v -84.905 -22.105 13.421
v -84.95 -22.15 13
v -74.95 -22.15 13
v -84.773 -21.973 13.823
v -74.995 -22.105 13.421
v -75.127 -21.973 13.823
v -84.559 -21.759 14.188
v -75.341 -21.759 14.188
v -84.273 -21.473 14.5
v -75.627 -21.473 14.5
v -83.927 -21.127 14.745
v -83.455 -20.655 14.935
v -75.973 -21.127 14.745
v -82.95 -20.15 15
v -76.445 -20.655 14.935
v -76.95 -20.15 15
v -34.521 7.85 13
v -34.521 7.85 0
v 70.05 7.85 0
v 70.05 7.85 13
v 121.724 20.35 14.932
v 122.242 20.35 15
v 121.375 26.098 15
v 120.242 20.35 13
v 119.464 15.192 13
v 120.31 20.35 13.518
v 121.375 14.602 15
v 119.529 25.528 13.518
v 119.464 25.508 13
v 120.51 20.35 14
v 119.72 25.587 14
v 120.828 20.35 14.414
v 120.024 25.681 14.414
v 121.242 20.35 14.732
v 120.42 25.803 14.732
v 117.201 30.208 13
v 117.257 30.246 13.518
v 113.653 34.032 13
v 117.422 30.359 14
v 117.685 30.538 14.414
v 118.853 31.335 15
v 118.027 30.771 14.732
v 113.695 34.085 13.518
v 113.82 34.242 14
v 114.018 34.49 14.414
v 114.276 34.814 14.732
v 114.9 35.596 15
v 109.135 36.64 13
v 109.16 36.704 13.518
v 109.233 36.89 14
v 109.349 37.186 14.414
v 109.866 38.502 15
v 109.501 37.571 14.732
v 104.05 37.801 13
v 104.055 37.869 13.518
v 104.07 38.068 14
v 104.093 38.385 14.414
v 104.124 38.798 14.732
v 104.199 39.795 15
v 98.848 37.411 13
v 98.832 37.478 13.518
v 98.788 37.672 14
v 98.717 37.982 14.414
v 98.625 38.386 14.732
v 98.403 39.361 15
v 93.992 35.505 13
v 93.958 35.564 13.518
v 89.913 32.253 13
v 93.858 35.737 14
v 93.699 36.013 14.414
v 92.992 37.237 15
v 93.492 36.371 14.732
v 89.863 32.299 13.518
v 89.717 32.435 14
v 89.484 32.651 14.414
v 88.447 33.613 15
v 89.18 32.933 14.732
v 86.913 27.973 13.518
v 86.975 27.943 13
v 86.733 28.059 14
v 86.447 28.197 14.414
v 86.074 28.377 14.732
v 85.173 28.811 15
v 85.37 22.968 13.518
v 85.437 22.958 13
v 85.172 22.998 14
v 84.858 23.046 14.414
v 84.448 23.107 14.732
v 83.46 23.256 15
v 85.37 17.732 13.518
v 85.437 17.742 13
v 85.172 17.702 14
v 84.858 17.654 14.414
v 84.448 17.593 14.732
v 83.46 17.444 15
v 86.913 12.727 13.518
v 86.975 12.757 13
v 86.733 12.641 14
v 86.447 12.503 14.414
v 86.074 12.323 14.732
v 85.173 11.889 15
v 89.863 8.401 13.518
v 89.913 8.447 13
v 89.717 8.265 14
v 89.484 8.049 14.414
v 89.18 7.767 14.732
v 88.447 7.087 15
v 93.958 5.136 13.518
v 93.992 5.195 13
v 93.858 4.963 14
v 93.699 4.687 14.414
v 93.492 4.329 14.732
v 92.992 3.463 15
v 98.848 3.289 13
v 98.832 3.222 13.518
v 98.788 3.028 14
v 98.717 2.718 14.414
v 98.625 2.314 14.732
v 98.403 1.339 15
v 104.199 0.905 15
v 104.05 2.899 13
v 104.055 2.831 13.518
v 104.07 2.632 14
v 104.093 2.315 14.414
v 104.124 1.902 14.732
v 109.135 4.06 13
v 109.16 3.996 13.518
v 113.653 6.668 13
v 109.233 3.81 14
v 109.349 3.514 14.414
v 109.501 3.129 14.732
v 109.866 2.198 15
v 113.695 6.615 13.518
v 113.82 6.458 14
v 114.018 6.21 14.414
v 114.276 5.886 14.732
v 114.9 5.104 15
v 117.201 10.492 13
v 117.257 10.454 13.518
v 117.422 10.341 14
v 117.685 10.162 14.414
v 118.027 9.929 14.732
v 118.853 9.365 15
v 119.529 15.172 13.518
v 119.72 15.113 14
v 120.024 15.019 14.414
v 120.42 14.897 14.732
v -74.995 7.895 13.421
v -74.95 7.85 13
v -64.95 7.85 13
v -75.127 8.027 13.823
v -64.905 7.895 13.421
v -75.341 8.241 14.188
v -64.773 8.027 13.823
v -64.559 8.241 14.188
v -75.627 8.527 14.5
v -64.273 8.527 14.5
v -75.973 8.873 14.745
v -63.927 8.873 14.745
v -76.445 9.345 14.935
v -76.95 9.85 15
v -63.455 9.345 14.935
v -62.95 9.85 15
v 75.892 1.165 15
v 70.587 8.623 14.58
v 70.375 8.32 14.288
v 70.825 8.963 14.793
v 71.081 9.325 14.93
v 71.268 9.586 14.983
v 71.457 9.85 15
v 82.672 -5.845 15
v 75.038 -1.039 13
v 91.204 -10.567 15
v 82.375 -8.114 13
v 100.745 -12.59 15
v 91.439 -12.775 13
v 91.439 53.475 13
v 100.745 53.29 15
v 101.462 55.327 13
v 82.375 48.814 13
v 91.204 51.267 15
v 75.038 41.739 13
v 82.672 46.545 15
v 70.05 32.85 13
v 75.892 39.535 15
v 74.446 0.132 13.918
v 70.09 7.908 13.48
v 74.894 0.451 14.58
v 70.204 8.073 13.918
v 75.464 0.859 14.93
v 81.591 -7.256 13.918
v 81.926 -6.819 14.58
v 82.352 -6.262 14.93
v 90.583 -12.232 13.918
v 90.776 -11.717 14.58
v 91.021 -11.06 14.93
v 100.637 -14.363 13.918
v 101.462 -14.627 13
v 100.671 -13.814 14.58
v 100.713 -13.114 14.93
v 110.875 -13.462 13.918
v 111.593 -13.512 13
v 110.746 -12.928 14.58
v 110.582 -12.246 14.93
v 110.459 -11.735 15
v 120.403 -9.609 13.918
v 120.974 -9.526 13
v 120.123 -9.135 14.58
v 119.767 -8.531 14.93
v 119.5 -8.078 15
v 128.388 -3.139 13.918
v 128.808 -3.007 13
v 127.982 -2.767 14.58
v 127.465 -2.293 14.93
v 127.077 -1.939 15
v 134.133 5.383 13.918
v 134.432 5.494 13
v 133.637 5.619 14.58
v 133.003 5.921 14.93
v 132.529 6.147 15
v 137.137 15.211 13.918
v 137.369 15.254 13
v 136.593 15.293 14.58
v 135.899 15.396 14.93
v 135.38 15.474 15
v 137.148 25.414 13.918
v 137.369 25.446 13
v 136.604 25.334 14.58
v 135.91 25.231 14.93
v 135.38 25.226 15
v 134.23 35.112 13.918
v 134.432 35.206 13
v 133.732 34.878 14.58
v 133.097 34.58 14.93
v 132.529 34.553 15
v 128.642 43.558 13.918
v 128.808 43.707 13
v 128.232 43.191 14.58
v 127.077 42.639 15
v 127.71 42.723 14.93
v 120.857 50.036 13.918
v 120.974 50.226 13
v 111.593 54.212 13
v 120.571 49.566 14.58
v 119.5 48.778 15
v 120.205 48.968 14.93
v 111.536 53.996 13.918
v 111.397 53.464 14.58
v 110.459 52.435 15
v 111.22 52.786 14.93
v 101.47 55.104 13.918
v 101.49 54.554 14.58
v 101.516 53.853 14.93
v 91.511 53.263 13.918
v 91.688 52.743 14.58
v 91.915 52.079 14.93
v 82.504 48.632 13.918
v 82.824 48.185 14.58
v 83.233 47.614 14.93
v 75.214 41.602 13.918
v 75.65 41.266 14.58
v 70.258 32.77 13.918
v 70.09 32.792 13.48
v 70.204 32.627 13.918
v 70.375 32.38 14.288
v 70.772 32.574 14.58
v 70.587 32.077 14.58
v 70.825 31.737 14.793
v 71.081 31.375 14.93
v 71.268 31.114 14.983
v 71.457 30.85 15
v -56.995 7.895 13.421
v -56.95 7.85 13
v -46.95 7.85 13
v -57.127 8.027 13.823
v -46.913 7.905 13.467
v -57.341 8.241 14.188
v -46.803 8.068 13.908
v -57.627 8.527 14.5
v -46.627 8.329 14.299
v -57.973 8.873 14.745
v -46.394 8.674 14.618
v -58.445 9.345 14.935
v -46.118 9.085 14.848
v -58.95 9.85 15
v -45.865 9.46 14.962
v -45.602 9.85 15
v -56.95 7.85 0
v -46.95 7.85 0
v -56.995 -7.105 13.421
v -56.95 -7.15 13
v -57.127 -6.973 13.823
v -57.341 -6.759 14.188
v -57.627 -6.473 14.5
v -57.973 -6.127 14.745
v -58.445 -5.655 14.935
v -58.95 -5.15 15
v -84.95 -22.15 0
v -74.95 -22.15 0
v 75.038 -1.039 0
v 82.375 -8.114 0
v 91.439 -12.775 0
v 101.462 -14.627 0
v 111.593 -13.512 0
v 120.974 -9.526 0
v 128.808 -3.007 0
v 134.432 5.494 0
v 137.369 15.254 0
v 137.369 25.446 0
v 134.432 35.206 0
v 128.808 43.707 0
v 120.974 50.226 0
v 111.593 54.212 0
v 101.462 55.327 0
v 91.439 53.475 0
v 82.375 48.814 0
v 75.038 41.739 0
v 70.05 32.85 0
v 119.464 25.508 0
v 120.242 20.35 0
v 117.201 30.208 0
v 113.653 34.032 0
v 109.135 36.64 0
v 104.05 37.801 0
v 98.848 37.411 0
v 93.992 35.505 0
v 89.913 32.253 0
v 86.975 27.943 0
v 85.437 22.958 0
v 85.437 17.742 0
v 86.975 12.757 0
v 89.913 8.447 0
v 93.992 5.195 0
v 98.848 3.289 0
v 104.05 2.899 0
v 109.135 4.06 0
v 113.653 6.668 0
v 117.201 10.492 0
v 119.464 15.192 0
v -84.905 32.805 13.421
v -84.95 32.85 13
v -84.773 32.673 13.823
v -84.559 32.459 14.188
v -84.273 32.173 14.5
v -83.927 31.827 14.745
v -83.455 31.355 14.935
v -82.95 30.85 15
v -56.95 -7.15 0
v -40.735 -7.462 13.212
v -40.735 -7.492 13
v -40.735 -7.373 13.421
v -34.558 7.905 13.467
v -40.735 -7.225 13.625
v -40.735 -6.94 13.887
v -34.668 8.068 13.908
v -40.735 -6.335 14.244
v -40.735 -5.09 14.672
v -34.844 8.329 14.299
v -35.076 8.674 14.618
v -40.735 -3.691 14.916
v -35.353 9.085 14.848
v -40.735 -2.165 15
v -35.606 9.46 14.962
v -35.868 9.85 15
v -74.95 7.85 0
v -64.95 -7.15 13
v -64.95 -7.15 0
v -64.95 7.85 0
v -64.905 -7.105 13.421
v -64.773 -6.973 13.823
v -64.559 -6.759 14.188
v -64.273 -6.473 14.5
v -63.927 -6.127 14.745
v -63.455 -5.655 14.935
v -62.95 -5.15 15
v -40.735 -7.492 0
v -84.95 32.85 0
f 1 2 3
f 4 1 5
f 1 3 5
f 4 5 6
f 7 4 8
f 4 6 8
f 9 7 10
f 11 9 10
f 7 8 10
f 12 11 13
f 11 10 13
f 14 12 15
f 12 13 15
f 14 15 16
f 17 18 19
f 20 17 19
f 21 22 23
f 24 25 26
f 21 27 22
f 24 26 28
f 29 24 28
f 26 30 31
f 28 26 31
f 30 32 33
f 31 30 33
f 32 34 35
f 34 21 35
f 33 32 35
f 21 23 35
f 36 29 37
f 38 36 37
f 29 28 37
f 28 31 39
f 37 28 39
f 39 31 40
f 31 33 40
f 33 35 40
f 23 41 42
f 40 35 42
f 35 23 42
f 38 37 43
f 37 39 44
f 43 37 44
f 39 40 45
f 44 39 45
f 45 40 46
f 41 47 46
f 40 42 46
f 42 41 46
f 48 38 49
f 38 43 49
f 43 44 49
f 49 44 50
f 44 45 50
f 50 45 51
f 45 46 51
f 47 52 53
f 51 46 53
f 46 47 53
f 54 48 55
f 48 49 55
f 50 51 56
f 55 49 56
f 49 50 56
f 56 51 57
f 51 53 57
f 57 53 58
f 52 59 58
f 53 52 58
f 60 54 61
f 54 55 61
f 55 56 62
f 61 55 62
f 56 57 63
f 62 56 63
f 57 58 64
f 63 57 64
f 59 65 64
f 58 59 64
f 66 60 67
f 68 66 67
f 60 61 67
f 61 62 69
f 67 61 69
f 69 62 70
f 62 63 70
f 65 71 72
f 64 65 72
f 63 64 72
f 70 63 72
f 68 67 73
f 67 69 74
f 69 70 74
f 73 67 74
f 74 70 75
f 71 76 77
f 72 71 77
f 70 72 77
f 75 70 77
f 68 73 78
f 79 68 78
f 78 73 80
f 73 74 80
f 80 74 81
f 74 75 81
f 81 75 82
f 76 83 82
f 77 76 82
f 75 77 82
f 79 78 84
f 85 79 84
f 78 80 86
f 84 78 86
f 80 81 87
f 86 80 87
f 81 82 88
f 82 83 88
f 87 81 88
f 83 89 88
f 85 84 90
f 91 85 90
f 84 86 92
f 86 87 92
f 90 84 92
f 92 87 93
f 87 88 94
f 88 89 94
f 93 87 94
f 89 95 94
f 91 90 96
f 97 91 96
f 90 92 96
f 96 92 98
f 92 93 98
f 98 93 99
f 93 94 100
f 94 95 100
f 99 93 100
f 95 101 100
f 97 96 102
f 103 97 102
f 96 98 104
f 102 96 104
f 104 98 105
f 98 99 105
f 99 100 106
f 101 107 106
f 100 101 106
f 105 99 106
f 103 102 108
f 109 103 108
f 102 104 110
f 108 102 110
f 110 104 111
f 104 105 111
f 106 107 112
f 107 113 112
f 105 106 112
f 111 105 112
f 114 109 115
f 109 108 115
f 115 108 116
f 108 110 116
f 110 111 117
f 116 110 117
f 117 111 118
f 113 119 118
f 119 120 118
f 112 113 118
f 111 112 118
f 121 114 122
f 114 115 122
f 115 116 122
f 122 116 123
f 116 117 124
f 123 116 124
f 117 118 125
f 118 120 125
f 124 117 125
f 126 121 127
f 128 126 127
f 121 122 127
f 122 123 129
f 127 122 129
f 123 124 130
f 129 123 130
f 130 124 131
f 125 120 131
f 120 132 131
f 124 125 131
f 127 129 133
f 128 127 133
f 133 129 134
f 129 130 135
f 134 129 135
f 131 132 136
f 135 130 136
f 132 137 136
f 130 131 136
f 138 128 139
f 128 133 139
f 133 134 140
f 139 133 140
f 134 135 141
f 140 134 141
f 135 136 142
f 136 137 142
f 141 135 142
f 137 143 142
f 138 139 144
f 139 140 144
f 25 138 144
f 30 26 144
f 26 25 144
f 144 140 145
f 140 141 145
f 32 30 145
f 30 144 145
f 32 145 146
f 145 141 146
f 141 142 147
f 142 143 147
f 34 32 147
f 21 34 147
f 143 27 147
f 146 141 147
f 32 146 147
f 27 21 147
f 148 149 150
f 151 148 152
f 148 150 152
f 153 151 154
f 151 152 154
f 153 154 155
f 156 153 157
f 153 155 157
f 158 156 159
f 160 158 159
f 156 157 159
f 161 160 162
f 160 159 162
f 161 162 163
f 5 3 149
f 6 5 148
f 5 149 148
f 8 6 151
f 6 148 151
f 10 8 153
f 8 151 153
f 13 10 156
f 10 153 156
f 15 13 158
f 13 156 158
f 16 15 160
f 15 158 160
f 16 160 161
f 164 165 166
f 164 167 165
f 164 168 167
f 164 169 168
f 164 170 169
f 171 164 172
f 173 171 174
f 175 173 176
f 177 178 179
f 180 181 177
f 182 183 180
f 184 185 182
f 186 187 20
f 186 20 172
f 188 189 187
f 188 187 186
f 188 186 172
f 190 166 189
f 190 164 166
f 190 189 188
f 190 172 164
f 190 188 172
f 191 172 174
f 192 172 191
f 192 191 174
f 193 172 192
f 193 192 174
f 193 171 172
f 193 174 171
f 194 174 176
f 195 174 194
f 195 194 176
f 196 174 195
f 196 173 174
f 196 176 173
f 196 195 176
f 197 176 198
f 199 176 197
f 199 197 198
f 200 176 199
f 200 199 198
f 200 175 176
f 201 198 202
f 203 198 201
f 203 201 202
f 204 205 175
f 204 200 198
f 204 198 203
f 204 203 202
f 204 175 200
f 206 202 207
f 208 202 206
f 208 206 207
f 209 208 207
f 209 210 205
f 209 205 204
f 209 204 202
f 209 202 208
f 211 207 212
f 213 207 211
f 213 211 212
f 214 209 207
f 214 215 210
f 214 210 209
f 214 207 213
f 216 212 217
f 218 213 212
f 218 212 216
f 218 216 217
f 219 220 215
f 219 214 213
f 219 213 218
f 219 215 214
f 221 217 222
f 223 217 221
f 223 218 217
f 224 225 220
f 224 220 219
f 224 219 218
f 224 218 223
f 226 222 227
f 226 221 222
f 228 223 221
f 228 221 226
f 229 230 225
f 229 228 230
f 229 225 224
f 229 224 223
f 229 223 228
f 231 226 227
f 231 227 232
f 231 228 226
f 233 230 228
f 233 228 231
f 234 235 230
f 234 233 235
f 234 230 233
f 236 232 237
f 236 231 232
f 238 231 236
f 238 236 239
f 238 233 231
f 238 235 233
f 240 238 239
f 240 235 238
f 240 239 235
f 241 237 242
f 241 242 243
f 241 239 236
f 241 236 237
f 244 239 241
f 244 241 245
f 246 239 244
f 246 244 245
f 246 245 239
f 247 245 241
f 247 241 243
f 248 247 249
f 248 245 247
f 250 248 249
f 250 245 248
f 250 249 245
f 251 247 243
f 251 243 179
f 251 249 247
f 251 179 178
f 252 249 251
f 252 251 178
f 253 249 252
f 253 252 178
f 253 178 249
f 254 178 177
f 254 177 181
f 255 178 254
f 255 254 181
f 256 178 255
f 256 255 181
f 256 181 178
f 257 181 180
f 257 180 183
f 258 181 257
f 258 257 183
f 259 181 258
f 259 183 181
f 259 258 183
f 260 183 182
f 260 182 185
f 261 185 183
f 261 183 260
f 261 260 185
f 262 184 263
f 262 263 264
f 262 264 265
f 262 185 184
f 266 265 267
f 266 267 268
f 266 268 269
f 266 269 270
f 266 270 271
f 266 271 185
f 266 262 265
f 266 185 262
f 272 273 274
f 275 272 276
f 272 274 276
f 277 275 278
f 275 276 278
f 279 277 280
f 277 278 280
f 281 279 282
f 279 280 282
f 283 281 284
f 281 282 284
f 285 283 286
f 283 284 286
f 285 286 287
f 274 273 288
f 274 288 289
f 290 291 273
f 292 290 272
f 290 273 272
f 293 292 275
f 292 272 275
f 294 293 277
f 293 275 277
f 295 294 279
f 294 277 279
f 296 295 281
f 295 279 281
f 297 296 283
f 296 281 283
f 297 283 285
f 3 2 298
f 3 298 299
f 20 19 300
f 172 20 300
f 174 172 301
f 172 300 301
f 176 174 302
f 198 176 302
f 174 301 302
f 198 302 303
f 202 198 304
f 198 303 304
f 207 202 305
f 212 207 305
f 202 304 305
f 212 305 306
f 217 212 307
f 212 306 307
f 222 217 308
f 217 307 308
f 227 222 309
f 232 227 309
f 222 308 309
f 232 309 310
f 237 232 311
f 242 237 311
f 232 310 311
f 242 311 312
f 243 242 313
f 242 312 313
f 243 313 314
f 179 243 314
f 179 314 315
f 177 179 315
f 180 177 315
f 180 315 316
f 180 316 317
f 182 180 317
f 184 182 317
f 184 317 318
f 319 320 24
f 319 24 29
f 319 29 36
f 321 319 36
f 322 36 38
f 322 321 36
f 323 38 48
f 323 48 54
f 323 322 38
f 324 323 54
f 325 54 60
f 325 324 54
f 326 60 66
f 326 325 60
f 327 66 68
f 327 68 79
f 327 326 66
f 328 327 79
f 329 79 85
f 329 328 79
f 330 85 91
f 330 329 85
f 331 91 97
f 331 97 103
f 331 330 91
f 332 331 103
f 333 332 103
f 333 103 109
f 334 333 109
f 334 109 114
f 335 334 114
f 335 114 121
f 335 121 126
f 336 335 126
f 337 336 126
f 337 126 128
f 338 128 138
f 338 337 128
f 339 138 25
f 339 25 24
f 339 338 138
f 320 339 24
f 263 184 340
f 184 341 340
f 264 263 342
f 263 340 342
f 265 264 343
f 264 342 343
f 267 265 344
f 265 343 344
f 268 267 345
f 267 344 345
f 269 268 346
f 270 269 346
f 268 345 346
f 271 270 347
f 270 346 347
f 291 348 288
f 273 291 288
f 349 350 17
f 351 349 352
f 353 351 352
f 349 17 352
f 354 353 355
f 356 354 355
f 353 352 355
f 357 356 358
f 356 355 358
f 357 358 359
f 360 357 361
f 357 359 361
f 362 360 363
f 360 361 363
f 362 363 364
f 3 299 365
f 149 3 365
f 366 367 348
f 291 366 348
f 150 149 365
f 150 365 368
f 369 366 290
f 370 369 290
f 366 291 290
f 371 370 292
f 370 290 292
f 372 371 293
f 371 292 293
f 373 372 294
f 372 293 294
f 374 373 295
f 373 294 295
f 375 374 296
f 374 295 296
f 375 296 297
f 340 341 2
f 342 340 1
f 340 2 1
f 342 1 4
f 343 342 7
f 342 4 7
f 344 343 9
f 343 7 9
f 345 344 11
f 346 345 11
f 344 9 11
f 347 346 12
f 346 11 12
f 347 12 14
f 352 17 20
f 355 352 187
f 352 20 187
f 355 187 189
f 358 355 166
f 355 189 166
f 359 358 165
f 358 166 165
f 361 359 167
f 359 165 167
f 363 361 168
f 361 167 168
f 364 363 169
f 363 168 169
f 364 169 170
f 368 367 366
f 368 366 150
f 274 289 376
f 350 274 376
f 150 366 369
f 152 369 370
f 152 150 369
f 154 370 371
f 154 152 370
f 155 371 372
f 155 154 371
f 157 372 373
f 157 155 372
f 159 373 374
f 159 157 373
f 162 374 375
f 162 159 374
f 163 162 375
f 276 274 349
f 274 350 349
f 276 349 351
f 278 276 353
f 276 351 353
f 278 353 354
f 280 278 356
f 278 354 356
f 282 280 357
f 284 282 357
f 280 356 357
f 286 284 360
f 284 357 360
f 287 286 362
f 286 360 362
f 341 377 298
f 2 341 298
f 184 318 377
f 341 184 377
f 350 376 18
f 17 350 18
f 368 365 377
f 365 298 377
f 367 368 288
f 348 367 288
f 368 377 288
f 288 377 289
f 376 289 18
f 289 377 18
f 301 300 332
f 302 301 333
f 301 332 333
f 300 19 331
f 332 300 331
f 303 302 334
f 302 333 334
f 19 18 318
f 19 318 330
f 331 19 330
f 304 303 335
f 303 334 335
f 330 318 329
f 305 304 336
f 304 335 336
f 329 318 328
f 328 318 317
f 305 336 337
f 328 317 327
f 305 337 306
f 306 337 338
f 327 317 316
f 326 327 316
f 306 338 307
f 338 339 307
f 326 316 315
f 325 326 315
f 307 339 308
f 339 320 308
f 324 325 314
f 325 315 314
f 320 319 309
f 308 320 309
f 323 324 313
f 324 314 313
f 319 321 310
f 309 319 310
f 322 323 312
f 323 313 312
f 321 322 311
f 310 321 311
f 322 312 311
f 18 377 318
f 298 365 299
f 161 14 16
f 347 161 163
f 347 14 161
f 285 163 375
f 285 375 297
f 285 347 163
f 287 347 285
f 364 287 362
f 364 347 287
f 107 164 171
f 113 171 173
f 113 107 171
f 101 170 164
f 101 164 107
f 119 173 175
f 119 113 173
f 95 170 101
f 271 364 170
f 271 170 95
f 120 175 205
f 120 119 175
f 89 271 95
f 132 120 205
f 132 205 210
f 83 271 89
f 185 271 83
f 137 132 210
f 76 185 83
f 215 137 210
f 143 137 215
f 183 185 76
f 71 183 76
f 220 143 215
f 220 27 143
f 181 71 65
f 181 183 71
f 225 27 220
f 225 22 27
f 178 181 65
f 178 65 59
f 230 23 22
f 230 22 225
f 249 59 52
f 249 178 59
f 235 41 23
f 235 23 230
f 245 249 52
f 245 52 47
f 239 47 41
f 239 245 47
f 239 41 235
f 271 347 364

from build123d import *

# Parameters (mm, degrees)
F0_R     = 17.5
F0_W     = 10
F0_H     = 30
F0_W_2   = 8
F0_H_2   = 15
F1_DEPTH = 15
F2_R     = 2


with BuildPart() as f1:
    # F0 (on Top) → F1 (new body)
    with BuildSketch(Plane.XY):
        Polygon((70.049999, 32.850001), (-84.950001, 32.850001), (-84.950001, 7.850001), (-74.950001, 7.850001), (-64.950001, 7.850001), (-56.950001, 7.850001), (-46.950001, 7.850001), (-34.520773, 7.850001), (70.049999, 7.850001), align=None)
        with BuildLine():
            ThreePointArc((70.049999, 7.850001), (137.741741, 20.350001), (70.049999, 32.850001))
            Line((70.049999, 32.850001), (70.049999, 7.850001))
        make_face()
        with Locations((102.741741, 20.350001)):
            Circle(F0_R, mode=Mode.SUBTRACT)
        with Locations((-79.950001, -7.149999)):
            Rectangle(F0_W, F0_H)
        Polygon((-40.735387, -7.49211), (-34.520773, 7.850001), (-46.950001, 7.850001), align=None)
        with Locations((-60.950001, 0.350001)):
            Rectangle(F0_W_2, F0_H_2)
    extrude(amount=F1_DEPTH)

    # F2
    f2_edges = [f1.edges().sort_by_distance(p)[0] for p in [
        (-7.450001, 32.850001, 15),
        (-84.950001, 5.350001, 15),
        (-79.950001, -22.149999, 15),
        (-74.950001, -7.149999, 15),
        (-69.950001, 7.850001, 15),
        (-64.950001, 0.350001, 15),
        (-60.950001, -7.149999, 15),
        (-56.950001, 0.350001, 15),
        (-51.950001, 7.850001, 15),
        (-43.842694, 0.178945, 15),
        (-37.62808, 0.178945, 15),
        (17.764613, 7.850001, 15),
        (137.741741, 20.350001, 15),
        (85.241741, 20.350001, 15),
    ]]
    fillet(f2_edges, radius=F2_R)


solid = f1.part
